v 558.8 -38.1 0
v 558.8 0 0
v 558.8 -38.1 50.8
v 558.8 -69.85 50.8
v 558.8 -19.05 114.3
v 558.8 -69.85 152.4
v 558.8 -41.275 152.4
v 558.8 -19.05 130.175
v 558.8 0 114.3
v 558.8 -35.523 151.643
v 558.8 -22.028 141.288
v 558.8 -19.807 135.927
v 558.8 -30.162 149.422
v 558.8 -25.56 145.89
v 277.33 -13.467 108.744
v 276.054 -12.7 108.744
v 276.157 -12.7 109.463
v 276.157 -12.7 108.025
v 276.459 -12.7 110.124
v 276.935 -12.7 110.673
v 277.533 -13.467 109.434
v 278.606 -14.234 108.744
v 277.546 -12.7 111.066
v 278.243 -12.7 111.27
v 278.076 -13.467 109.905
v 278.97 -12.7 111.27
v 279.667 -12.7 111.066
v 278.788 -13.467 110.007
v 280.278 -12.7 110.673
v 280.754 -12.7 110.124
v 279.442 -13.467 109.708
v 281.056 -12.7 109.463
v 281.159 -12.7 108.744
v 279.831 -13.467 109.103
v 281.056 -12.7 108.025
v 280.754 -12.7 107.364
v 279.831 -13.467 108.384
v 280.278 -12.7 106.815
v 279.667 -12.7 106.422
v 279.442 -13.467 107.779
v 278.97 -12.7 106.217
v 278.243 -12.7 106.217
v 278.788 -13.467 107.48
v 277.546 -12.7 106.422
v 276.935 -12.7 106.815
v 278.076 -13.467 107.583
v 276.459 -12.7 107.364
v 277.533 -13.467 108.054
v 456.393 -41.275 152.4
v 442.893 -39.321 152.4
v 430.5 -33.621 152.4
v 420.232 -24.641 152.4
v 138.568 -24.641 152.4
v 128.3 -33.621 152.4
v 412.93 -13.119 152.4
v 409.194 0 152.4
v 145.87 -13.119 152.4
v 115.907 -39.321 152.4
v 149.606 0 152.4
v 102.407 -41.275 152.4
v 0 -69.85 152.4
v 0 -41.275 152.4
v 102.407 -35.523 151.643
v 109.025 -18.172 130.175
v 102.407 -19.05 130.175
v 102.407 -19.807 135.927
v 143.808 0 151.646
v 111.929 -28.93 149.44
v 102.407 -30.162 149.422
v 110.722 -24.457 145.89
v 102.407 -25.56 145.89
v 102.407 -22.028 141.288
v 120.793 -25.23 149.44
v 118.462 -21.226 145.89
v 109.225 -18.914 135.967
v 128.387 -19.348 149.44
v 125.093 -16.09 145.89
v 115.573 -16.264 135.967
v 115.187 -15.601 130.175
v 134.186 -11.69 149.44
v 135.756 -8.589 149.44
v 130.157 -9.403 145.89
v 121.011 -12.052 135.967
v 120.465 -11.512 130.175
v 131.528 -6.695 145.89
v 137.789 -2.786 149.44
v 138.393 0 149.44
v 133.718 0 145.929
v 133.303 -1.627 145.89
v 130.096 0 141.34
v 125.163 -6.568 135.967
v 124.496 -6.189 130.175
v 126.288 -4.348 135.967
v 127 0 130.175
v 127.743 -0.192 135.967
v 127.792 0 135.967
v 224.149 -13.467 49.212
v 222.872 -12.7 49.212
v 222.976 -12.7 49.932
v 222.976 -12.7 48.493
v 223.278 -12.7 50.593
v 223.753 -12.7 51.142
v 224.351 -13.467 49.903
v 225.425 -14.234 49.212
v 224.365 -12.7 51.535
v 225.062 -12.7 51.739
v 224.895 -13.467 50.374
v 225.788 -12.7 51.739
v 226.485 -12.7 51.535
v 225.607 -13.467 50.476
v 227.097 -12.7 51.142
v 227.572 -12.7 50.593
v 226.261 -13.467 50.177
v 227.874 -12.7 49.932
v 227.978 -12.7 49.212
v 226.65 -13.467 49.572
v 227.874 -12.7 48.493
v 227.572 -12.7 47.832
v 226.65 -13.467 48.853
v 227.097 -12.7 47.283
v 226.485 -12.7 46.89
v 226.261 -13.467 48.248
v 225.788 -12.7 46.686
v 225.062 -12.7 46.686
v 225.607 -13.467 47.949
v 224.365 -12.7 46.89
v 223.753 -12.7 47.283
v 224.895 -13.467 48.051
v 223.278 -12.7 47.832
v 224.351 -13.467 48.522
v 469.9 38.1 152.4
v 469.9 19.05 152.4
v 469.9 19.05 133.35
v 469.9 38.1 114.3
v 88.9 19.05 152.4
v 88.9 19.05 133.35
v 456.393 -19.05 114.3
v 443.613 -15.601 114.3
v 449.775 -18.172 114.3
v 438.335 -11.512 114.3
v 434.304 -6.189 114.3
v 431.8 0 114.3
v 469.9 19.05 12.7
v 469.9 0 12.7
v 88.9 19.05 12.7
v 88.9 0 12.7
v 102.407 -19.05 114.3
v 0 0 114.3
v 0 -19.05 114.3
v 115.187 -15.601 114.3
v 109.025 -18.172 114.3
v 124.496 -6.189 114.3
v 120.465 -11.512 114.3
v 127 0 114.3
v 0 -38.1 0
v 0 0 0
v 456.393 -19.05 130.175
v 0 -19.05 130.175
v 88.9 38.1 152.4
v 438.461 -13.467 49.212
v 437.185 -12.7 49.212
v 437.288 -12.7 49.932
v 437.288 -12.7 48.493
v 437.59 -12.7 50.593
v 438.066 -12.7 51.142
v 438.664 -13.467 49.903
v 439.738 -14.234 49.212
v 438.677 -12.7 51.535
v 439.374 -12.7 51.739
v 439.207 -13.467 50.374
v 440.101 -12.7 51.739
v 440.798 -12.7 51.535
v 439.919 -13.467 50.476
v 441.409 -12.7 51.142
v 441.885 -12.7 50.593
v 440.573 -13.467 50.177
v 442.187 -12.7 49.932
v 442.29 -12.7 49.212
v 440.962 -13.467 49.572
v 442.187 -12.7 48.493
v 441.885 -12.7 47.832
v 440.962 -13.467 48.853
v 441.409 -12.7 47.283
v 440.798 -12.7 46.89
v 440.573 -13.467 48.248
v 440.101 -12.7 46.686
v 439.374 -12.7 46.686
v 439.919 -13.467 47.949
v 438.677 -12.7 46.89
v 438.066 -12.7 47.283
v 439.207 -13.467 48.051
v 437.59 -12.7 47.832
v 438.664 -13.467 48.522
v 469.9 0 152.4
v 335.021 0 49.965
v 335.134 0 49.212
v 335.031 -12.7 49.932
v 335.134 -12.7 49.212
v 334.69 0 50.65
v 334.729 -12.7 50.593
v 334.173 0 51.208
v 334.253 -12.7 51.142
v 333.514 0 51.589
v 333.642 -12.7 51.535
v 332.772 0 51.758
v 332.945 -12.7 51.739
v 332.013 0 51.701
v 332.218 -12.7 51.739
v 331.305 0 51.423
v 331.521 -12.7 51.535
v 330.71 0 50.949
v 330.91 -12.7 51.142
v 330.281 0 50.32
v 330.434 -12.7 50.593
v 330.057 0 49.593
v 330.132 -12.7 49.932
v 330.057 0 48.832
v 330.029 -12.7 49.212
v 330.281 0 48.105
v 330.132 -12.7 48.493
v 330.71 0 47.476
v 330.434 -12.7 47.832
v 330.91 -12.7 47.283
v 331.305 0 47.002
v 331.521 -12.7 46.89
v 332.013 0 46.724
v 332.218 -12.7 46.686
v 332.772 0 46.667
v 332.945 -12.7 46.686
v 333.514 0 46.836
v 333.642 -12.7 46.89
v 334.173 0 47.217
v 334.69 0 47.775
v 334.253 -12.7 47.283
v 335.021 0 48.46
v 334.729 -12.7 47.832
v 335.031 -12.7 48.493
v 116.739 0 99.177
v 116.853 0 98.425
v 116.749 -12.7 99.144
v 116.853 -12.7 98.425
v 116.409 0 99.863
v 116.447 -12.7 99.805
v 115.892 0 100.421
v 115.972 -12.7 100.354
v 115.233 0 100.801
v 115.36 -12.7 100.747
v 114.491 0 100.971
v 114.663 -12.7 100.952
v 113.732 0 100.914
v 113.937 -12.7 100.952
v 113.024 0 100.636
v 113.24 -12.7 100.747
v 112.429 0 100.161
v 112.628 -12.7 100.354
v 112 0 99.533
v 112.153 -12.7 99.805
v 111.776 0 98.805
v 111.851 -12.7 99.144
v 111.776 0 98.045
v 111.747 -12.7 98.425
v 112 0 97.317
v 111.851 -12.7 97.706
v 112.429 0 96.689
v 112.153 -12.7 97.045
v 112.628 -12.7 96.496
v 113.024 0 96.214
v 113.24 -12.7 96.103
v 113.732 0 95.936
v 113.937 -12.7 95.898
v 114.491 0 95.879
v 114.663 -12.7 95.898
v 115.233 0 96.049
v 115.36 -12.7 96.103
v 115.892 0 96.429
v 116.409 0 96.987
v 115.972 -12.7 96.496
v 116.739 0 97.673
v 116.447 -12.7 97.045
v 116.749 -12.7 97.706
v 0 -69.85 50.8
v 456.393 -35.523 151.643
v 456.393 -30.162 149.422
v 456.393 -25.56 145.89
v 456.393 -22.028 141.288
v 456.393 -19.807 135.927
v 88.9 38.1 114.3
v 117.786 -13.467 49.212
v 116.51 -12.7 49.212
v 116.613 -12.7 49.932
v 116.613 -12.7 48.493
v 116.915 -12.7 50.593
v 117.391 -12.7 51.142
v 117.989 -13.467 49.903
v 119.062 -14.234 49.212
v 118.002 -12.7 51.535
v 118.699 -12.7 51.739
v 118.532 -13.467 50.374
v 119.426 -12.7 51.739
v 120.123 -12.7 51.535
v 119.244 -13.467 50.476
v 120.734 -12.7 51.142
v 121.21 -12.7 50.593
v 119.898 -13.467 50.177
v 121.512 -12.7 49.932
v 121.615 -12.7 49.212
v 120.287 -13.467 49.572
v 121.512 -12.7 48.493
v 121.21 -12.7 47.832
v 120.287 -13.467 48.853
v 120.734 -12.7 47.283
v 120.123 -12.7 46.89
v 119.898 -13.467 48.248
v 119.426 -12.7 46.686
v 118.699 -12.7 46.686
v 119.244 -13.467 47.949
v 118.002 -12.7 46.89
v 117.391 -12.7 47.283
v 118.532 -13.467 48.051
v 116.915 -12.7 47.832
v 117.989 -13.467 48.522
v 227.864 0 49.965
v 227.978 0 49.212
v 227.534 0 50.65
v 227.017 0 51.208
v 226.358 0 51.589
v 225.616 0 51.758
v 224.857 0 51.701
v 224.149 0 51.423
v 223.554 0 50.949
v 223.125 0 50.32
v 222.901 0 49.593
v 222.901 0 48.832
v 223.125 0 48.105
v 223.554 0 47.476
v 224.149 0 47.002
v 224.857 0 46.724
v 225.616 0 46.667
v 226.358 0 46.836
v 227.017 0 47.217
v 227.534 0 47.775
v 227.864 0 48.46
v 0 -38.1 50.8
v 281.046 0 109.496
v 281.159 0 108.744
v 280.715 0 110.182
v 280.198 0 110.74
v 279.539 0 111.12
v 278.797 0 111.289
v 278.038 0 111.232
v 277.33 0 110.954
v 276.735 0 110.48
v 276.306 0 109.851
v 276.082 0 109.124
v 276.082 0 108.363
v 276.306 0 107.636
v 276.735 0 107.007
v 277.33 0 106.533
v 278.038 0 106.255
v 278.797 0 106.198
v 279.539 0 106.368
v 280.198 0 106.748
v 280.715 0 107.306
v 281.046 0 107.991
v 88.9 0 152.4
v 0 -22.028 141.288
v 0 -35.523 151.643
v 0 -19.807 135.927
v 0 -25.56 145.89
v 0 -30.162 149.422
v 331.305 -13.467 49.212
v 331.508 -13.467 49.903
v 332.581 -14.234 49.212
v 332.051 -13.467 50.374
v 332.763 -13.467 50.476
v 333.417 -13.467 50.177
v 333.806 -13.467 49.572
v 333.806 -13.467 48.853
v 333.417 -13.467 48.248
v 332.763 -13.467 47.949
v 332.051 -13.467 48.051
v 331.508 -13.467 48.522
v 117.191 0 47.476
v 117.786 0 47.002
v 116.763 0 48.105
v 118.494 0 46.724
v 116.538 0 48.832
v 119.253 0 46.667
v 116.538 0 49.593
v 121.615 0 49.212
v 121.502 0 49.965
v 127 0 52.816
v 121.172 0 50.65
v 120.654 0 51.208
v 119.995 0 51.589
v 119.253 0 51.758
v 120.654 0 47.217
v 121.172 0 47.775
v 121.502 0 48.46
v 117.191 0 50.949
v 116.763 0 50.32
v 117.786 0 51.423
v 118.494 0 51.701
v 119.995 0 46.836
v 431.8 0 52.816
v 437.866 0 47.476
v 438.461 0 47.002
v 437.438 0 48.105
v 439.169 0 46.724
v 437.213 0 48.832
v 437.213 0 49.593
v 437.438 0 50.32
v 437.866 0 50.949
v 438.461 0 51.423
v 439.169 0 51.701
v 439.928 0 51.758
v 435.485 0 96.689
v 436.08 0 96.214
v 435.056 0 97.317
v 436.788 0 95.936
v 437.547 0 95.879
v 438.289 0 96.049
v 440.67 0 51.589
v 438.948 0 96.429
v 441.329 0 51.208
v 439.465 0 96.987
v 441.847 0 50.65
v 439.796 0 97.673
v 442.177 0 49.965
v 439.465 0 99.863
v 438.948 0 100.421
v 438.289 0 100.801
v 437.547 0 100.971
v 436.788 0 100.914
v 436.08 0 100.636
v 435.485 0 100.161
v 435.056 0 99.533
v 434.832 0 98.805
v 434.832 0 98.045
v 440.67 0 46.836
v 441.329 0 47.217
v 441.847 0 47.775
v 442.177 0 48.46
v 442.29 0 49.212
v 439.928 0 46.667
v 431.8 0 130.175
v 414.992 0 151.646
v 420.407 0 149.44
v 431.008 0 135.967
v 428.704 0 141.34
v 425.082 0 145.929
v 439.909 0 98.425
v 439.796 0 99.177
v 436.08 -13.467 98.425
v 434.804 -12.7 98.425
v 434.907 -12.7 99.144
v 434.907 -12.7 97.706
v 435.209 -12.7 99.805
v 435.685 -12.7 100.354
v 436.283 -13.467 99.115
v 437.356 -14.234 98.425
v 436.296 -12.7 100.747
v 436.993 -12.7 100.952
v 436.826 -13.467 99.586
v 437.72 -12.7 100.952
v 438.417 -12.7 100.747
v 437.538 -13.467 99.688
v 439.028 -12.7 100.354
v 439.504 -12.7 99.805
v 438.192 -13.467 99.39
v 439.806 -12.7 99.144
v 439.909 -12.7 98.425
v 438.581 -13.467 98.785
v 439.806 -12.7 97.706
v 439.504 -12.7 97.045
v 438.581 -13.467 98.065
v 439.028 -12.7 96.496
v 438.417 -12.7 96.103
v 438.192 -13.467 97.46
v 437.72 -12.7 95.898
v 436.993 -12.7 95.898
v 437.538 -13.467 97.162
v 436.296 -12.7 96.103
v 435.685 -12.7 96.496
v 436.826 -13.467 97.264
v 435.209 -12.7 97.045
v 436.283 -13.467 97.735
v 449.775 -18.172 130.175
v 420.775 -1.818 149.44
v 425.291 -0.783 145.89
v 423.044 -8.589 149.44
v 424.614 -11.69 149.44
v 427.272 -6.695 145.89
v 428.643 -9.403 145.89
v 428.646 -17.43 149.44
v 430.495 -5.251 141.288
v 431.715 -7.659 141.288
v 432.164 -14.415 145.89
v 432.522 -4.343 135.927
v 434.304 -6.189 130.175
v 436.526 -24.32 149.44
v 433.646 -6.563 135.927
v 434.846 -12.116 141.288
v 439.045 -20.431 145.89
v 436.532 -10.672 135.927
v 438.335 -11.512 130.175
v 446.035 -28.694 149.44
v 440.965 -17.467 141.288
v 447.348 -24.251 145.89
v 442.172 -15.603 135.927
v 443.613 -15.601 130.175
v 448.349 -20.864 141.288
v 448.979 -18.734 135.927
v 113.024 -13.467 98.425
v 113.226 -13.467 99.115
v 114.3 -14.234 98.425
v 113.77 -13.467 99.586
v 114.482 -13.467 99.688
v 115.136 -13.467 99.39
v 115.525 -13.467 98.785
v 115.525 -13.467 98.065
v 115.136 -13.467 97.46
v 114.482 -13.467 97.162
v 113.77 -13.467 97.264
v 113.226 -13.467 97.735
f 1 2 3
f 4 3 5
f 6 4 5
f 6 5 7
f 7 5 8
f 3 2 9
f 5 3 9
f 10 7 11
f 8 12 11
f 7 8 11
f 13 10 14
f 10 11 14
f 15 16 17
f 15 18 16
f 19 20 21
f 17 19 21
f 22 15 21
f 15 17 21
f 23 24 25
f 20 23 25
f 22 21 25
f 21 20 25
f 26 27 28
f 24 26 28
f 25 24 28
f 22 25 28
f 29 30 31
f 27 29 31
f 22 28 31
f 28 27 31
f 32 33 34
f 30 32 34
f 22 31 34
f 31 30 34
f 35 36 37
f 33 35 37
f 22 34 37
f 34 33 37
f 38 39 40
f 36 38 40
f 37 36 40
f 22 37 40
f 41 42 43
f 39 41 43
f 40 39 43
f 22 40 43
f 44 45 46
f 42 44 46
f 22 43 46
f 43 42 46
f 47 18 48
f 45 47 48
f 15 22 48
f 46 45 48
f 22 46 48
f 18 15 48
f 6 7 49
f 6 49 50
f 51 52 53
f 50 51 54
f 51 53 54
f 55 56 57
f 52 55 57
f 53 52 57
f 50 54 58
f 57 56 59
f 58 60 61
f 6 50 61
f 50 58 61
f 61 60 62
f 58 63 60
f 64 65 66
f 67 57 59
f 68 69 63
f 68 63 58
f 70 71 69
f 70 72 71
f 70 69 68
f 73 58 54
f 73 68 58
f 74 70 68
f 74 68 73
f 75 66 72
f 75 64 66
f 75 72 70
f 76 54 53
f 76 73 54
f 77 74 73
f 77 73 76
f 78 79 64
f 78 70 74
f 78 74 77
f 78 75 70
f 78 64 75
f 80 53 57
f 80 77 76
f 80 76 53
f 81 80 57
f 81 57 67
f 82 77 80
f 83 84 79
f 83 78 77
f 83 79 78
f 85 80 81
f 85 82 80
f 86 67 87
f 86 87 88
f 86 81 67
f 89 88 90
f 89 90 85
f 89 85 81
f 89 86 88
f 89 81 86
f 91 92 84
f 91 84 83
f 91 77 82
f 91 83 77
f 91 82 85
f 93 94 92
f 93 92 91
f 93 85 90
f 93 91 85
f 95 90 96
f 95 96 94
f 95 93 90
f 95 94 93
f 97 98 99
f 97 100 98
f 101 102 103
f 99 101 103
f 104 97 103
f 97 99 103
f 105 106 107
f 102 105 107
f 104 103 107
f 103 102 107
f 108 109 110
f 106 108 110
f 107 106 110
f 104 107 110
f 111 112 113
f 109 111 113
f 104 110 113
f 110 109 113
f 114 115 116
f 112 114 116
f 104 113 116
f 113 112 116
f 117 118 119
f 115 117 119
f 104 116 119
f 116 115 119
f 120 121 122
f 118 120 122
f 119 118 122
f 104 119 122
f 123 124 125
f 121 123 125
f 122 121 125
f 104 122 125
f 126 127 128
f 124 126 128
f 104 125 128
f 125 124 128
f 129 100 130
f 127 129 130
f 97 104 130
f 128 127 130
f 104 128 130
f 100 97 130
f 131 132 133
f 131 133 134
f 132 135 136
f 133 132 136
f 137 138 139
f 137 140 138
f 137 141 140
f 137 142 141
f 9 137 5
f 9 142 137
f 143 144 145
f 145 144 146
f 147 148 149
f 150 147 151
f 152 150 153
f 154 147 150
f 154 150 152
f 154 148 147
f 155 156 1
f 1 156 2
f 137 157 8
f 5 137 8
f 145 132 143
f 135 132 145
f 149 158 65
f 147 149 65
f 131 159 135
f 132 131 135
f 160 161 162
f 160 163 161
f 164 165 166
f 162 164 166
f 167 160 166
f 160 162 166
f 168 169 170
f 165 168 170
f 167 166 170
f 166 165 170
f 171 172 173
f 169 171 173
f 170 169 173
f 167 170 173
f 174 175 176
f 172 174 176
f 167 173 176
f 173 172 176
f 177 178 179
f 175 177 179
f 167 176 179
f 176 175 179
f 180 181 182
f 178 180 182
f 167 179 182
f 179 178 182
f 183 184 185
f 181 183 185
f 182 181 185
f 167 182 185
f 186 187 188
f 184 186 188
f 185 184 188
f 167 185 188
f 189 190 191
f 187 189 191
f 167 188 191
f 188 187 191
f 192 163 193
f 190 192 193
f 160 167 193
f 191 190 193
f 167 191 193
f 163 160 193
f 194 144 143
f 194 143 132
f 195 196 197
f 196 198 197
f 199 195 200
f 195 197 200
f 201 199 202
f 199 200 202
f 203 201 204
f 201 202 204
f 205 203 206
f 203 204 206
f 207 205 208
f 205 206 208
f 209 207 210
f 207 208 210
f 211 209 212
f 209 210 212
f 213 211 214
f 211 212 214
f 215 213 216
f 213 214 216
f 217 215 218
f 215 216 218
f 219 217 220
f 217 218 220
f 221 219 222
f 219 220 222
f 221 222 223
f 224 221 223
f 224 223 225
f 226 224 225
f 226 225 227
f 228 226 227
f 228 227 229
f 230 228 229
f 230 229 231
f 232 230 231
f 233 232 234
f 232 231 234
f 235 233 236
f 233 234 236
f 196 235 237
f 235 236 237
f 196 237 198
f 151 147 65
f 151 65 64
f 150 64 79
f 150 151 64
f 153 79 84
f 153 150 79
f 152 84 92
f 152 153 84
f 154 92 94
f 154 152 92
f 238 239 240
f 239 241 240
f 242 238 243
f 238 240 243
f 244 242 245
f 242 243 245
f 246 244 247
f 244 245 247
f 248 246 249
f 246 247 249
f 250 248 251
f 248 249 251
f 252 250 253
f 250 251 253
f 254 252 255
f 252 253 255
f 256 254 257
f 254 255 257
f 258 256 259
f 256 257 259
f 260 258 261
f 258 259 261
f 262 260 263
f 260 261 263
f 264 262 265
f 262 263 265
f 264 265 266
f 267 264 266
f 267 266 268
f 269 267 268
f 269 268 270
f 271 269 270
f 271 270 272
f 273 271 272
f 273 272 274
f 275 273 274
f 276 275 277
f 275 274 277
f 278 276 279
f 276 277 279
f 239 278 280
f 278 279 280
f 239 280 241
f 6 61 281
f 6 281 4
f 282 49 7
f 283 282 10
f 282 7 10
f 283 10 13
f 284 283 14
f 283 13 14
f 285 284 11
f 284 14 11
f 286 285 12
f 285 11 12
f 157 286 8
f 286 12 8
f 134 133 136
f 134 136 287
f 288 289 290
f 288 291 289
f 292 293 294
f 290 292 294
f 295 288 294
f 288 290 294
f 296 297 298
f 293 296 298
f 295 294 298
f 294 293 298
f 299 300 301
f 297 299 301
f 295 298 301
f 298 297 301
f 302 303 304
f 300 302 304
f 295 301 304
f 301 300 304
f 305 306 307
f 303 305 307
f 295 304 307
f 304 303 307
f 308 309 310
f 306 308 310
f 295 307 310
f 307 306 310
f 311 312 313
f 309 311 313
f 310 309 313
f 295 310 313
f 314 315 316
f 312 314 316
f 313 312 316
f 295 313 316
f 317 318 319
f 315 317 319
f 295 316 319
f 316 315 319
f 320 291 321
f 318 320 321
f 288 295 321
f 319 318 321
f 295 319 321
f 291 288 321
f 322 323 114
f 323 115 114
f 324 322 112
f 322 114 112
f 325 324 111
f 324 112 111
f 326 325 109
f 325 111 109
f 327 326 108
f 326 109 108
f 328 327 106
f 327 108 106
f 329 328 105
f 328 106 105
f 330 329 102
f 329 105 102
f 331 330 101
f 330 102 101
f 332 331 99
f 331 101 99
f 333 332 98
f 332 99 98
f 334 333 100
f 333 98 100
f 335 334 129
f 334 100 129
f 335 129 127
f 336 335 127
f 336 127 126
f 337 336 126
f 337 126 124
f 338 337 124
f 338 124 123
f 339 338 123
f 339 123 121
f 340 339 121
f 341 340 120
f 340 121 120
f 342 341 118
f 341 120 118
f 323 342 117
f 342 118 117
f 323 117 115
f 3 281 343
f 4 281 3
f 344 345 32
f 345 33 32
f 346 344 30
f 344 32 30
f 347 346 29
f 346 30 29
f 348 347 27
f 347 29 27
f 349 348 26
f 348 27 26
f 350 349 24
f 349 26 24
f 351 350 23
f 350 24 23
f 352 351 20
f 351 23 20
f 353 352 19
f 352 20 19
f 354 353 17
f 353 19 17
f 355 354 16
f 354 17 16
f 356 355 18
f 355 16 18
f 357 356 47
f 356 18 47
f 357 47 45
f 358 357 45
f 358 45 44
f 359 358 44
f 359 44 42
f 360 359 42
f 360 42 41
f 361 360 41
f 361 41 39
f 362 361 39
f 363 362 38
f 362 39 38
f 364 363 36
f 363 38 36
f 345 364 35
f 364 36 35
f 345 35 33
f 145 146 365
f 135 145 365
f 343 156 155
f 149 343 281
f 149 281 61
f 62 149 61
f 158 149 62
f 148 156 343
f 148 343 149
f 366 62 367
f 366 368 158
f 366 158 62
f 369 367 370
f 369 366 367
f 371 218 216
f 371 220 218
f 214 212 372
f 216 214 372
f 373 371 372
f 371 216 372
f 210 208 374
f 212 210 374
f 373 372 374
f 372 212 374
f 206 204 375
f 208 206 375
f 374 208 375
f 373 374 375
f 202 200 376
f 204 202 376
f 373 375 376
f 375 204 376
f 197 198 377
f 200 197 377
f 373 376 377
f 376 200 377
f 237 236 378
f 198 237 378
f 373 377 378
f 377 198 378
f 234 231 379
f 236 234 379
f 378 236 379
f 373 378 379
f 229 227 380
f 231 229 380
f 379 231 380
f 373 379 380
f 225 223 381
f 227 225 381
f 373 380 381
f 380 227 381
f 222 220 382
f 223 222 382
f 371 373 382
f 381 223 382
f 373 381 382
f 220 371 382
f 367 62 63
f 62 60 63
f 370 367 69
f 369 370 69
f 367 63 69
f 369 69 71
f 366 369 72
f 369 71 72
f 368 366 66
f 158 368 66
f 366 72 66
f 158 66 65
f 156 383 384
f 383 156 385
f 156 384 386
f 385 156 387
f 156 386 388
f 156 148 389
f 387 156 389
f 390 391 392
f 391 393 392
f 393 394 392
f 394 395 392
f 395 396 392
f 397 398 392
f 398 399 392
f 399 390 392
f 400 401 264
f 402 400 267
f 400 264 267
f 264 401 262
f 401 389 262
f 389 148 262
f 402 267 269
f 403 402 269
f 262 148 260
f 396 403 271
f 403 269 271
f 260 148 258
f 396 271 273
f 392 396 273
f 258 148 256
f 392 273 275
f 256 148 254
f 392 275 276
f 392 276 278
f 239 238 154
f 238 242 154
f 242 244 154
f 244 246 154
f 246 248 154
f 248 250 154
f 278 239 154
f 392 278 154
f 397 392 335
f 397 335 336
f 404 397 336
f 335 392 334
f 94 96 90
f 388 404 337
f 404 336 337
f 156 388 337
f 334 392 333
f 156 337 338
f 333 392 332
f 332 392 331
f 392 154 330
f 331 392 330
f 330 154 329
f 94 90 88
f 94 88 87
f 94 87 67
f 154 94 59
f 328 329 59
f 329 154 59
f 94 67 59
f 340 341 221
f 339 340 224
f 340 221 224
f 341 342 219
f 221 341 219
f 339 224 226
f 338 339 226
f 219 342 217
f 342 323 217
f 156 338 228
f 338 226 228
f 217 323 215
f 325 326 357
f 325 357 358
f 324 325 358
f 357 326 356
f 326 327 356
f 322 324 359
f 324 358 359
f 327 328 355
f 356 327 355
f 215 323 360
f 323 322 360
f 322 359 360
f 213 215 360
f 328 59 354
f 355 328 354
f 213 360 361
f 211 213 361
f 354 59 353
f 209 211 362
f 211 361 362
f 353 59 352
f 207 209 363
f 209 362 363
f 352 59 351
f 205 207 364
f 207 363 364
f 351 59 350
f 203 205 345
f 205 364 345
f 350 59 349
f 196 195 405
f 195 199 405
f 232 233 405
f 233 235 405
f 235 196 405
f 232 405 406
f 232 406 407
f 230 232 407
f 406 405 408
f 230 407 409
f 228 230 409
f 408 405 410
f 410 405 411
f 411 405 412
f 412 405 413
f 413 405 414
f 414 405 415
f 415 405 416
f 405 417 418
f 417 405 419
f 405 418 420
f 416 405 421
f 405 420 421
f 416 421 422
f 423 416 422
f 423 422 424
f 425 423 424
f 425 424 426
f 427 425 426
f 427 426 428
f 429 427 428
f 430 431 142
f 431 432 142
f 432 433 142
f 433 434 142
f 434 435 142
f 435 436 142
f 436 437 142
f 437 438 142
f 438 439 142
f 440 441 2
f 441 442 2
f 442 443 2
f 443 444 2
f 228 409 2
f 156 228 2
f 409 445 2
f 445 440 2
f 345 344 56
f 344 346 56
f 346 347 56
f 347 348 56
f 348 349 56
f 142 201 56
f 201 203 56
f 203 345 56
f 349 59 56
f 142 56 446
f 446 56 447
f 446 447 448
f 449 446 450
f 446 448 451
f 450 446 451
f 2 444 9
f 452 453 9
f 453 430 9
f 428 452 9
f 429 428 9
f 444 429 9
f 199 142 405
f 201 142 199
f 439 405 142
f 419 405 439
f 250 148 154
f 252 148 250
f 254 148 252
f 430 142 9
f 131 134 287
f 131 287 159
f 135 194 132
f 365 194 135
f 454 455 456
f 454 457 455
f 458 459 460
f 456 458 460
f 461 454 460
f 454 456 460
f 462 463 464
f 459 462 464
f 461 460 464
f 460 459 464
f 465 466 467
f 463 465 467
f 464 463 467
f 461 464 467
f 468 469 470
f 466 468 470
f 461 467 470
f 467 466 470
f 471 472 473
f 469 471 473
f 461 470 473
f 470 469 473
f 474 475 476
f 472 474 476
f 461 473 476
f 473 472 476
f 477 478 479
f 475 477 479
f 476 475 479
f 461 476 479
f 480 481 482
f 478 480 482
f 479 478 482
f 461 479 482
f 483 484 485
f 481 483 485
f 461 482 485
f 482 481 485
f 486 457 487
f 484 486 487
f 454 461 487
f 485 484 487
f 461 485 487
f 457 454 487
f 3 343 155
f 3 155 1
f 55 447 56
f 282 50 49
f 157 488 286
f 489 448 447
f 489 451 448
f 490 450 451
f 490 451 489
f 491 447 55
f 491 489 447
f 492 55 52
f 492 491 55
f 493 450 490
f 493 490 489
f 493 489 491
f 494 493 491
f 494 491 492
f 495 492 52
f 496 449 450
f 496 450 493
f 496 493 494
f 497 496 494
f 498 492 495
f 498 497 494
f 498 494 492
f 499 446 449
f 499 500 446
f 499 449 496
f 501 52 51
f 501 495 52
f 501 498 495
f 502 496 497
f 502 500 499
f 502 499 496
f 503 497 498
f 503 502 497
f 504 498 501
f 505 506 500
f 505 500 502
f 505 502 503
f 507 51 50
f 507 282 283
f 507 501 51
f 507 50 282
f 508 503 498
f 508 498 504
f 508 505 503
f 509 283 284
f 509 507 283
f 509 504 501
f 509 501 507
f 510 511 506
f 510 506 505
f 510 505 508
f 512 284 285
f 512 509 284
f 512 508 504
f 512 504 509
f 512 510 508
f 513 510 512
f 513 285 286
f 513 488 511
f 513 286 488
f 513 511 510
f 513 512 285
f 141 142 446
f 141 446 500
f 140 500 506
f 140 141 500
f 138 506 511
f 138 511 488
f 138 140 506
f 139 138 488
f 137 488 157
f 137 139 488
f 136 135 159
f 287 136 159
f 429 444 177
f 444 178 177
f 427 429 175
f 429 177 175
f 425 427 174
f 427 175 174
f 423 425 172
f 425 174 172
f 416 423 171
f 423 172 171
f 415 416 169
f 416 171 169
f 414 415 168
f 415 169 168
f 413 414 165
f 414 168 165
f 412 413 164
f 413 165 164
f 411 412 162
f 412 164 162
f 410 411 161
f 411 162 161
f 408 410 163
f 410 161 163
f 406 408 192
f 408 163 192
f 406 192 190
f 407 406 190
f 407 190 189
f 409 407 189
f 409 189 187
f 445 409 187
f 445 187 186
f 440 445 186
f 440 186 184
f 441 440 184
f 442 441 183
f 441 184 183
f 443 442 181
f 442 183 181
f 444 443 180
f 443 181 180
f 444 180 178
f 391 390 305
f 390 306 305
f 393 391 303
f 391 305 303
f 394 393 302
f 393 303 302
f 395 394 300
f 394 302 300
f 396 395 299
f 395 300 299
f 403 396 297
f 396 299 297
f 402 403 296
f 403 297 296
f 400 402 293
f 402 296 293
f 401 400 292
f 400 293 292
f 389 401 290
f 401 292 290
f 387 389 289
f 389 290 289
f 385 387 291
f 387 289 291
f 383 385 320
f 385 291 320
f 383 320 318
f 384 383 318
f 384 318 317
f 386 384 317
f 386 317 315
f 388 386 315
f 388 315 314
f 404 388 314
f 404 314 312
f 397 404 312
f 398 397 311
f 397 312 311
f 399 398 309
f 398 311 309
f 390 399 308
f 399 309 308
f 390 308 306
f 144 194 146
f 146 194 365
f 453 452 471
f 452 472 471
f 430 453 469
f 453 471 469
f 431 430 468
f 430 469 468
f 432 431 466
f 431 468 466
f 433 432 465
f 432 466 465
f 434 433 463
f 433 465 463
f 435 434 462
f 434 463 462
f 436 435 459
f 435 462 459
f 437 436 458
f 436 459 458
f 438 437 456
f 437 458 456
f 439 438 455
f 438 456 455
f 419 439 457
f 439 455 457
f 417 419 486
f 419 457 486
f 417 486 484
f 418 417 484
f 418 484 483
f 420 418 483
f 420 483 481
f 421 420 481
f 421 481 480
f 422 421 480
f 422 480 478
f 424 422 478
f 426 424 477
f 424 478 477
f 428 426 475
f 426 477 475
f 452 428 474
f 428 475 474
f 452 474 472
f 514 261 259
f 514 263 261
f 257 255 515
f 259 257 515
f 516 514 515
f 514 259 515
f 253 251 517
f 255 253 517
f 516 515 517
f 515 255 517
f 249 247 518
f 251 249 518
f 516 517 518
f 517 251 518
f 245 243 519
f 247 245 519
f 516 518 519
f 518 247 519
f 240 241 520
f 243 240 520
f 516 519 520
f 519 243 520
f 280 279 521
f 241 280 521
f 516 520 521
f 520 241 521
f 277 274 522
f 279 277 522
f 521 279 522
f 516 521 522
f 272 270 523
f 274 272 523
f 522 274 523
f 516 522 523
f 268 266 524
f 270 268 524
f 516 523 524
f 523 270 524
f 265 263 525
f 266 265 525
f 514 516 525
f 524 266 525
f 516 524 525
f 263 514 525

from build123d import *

# Parameters (mm, degrees)
F0_W        = 558.8
F0_H        = 152.4
F1_DEPTH    = 69.85
F2_W        = 558.8
F2_H        = 50.8
F3_DEPTH    = 31.75
F4_W        = 127
F4_H        = 19.05
F5_DEPTH    = 38.1
F6_T1_DEPTH = 99.583610621
F7_R        = 22.225
F9_D        = 5.1054
F9_DEPTH    = 12.7
F9_TIP      = 1.5338169022
F10_W       = 381
F10_H       = 139.7
F11_DEPTH   = 19.05
F13_DEPTH   = 381


# Not quite as in the source:
# - a fillet or chamfer that OpenCascade refuses, or shapes differently, is made with other operations: its cross-section is extruded or revolved along the edge and cut away or added


with BuildPart() as f1:
    # F0 (on Front) → F1 (new body)
    with BuildSketch(Plane.XZ):
        with Locations((279.4, 76.2)):
            Rectangle(F0_W, F0_H)
    extrude(amount=F1_DEPTH)

    # F2 (on face) → F3 (cut)
    with BuildSketch(Plane.XZ.offset(69.85)):
        with Locations((279.4, 25.4)):
            Rectangle(F2_W, F2_H)
    extrude(amount=-F3_DEPTH, mode=Mode.SUBTRACT)

    # F4 (on face) → F5 (cut)
    with BuildSketch(Plane.XY.offset(152.4)):
        with Locations((63.5, -9.525)):
            Rectangle(F4_W, F4_H)
        with Locations((495.3, -9.525)):
            Rectangle(F4_W, F4_H)
    extrude(amount=-F5_DEPTH, mode=Mode.SUBTRACT)

    # F6: fillet of radius 25.4 on 2 edges, made by hand

    # F6_s2 → F6_t1 (join)
    with BuildSketch(Plane.XY.offset(52.816389379)):
        with BuildLine():
            ThreePointArc((102.4065557516, -19.05), (117.9608156183, -13.7304631421), (127, 0))
            Line((127, 0), (127, -19.05))
            Line((127, -19.05), (102.4065557516, -19.05))
        make_face()
        with BuildLine():
            ThreePointArc((431.8, 0), (440.8391843817, -13.7304631421), (456.3934442484, -19.05))
            Line((456.3934442484, -19.05), (431.8, -19.05))
            Line((431.8, -19.05), (431.8, 0))
        make_face()
    extrude(amount=F6_T1_DEPTH)

    # F7
    f7_edges = [f1.edges().sort_by_distance(p)[0] for p in [
        (51.203278, -19.05, 152.4),
        (440.839184, -13.730463, 152.4),
        (507.596722, -19.05, 152.4),
        (117.960816, -13.730463, 152.4),
    ]]
    fillet(f7_edges, radius=F7_R)

    # F9
    with Locations(Plane(origin=(0, 0, 0), x_dir=(-1, 0, 0), z_dir=(0, 1, 0))):
        with Locations((-439.7375, 49.2125), (-437.35625, 98.425), (-332.58125, 49.2125), (-278.60625, 108.74375), (-225.425, 49.2125), (-119.0625, 49.2125), (-114.3, 98.425)):
            Hole(F9_D / 2, depth=F9_DEPTH)
            with Locations((0, 0, -(F9_DEPTH + F9_TIP / 2))):  # 118° drill point
                Cone(0, F9_D / 2, F9_TIP, mode=Mode.SUBTRACT)


with BuildPart() as f11:
    # F10 (on face) → F11 (new body)
    with BuildSketch(Plane(origin=(0, 0, 0), x_dir=(-1, 0, 0), z_dir=(0, 1, 0))):
        with Locations((-279.4, 82.55)):
            Rectangle(F10_W, F10_H)
    extrude(amount=F11_DEPTH)


with BuildPart() as f13:
    # F12 (on face) → F13 (new body)
    with BuildSketch(Plane.YZ.offset(469.9)):
        Polygon((38.1, 152.4), (19.05, 152.4), (19.05, 133.35), (38.1, 114.3), align=None)
    extrude(amount=-F13_DEPTH)


solid = Compound([f1.part, f11.part, f13.part])
